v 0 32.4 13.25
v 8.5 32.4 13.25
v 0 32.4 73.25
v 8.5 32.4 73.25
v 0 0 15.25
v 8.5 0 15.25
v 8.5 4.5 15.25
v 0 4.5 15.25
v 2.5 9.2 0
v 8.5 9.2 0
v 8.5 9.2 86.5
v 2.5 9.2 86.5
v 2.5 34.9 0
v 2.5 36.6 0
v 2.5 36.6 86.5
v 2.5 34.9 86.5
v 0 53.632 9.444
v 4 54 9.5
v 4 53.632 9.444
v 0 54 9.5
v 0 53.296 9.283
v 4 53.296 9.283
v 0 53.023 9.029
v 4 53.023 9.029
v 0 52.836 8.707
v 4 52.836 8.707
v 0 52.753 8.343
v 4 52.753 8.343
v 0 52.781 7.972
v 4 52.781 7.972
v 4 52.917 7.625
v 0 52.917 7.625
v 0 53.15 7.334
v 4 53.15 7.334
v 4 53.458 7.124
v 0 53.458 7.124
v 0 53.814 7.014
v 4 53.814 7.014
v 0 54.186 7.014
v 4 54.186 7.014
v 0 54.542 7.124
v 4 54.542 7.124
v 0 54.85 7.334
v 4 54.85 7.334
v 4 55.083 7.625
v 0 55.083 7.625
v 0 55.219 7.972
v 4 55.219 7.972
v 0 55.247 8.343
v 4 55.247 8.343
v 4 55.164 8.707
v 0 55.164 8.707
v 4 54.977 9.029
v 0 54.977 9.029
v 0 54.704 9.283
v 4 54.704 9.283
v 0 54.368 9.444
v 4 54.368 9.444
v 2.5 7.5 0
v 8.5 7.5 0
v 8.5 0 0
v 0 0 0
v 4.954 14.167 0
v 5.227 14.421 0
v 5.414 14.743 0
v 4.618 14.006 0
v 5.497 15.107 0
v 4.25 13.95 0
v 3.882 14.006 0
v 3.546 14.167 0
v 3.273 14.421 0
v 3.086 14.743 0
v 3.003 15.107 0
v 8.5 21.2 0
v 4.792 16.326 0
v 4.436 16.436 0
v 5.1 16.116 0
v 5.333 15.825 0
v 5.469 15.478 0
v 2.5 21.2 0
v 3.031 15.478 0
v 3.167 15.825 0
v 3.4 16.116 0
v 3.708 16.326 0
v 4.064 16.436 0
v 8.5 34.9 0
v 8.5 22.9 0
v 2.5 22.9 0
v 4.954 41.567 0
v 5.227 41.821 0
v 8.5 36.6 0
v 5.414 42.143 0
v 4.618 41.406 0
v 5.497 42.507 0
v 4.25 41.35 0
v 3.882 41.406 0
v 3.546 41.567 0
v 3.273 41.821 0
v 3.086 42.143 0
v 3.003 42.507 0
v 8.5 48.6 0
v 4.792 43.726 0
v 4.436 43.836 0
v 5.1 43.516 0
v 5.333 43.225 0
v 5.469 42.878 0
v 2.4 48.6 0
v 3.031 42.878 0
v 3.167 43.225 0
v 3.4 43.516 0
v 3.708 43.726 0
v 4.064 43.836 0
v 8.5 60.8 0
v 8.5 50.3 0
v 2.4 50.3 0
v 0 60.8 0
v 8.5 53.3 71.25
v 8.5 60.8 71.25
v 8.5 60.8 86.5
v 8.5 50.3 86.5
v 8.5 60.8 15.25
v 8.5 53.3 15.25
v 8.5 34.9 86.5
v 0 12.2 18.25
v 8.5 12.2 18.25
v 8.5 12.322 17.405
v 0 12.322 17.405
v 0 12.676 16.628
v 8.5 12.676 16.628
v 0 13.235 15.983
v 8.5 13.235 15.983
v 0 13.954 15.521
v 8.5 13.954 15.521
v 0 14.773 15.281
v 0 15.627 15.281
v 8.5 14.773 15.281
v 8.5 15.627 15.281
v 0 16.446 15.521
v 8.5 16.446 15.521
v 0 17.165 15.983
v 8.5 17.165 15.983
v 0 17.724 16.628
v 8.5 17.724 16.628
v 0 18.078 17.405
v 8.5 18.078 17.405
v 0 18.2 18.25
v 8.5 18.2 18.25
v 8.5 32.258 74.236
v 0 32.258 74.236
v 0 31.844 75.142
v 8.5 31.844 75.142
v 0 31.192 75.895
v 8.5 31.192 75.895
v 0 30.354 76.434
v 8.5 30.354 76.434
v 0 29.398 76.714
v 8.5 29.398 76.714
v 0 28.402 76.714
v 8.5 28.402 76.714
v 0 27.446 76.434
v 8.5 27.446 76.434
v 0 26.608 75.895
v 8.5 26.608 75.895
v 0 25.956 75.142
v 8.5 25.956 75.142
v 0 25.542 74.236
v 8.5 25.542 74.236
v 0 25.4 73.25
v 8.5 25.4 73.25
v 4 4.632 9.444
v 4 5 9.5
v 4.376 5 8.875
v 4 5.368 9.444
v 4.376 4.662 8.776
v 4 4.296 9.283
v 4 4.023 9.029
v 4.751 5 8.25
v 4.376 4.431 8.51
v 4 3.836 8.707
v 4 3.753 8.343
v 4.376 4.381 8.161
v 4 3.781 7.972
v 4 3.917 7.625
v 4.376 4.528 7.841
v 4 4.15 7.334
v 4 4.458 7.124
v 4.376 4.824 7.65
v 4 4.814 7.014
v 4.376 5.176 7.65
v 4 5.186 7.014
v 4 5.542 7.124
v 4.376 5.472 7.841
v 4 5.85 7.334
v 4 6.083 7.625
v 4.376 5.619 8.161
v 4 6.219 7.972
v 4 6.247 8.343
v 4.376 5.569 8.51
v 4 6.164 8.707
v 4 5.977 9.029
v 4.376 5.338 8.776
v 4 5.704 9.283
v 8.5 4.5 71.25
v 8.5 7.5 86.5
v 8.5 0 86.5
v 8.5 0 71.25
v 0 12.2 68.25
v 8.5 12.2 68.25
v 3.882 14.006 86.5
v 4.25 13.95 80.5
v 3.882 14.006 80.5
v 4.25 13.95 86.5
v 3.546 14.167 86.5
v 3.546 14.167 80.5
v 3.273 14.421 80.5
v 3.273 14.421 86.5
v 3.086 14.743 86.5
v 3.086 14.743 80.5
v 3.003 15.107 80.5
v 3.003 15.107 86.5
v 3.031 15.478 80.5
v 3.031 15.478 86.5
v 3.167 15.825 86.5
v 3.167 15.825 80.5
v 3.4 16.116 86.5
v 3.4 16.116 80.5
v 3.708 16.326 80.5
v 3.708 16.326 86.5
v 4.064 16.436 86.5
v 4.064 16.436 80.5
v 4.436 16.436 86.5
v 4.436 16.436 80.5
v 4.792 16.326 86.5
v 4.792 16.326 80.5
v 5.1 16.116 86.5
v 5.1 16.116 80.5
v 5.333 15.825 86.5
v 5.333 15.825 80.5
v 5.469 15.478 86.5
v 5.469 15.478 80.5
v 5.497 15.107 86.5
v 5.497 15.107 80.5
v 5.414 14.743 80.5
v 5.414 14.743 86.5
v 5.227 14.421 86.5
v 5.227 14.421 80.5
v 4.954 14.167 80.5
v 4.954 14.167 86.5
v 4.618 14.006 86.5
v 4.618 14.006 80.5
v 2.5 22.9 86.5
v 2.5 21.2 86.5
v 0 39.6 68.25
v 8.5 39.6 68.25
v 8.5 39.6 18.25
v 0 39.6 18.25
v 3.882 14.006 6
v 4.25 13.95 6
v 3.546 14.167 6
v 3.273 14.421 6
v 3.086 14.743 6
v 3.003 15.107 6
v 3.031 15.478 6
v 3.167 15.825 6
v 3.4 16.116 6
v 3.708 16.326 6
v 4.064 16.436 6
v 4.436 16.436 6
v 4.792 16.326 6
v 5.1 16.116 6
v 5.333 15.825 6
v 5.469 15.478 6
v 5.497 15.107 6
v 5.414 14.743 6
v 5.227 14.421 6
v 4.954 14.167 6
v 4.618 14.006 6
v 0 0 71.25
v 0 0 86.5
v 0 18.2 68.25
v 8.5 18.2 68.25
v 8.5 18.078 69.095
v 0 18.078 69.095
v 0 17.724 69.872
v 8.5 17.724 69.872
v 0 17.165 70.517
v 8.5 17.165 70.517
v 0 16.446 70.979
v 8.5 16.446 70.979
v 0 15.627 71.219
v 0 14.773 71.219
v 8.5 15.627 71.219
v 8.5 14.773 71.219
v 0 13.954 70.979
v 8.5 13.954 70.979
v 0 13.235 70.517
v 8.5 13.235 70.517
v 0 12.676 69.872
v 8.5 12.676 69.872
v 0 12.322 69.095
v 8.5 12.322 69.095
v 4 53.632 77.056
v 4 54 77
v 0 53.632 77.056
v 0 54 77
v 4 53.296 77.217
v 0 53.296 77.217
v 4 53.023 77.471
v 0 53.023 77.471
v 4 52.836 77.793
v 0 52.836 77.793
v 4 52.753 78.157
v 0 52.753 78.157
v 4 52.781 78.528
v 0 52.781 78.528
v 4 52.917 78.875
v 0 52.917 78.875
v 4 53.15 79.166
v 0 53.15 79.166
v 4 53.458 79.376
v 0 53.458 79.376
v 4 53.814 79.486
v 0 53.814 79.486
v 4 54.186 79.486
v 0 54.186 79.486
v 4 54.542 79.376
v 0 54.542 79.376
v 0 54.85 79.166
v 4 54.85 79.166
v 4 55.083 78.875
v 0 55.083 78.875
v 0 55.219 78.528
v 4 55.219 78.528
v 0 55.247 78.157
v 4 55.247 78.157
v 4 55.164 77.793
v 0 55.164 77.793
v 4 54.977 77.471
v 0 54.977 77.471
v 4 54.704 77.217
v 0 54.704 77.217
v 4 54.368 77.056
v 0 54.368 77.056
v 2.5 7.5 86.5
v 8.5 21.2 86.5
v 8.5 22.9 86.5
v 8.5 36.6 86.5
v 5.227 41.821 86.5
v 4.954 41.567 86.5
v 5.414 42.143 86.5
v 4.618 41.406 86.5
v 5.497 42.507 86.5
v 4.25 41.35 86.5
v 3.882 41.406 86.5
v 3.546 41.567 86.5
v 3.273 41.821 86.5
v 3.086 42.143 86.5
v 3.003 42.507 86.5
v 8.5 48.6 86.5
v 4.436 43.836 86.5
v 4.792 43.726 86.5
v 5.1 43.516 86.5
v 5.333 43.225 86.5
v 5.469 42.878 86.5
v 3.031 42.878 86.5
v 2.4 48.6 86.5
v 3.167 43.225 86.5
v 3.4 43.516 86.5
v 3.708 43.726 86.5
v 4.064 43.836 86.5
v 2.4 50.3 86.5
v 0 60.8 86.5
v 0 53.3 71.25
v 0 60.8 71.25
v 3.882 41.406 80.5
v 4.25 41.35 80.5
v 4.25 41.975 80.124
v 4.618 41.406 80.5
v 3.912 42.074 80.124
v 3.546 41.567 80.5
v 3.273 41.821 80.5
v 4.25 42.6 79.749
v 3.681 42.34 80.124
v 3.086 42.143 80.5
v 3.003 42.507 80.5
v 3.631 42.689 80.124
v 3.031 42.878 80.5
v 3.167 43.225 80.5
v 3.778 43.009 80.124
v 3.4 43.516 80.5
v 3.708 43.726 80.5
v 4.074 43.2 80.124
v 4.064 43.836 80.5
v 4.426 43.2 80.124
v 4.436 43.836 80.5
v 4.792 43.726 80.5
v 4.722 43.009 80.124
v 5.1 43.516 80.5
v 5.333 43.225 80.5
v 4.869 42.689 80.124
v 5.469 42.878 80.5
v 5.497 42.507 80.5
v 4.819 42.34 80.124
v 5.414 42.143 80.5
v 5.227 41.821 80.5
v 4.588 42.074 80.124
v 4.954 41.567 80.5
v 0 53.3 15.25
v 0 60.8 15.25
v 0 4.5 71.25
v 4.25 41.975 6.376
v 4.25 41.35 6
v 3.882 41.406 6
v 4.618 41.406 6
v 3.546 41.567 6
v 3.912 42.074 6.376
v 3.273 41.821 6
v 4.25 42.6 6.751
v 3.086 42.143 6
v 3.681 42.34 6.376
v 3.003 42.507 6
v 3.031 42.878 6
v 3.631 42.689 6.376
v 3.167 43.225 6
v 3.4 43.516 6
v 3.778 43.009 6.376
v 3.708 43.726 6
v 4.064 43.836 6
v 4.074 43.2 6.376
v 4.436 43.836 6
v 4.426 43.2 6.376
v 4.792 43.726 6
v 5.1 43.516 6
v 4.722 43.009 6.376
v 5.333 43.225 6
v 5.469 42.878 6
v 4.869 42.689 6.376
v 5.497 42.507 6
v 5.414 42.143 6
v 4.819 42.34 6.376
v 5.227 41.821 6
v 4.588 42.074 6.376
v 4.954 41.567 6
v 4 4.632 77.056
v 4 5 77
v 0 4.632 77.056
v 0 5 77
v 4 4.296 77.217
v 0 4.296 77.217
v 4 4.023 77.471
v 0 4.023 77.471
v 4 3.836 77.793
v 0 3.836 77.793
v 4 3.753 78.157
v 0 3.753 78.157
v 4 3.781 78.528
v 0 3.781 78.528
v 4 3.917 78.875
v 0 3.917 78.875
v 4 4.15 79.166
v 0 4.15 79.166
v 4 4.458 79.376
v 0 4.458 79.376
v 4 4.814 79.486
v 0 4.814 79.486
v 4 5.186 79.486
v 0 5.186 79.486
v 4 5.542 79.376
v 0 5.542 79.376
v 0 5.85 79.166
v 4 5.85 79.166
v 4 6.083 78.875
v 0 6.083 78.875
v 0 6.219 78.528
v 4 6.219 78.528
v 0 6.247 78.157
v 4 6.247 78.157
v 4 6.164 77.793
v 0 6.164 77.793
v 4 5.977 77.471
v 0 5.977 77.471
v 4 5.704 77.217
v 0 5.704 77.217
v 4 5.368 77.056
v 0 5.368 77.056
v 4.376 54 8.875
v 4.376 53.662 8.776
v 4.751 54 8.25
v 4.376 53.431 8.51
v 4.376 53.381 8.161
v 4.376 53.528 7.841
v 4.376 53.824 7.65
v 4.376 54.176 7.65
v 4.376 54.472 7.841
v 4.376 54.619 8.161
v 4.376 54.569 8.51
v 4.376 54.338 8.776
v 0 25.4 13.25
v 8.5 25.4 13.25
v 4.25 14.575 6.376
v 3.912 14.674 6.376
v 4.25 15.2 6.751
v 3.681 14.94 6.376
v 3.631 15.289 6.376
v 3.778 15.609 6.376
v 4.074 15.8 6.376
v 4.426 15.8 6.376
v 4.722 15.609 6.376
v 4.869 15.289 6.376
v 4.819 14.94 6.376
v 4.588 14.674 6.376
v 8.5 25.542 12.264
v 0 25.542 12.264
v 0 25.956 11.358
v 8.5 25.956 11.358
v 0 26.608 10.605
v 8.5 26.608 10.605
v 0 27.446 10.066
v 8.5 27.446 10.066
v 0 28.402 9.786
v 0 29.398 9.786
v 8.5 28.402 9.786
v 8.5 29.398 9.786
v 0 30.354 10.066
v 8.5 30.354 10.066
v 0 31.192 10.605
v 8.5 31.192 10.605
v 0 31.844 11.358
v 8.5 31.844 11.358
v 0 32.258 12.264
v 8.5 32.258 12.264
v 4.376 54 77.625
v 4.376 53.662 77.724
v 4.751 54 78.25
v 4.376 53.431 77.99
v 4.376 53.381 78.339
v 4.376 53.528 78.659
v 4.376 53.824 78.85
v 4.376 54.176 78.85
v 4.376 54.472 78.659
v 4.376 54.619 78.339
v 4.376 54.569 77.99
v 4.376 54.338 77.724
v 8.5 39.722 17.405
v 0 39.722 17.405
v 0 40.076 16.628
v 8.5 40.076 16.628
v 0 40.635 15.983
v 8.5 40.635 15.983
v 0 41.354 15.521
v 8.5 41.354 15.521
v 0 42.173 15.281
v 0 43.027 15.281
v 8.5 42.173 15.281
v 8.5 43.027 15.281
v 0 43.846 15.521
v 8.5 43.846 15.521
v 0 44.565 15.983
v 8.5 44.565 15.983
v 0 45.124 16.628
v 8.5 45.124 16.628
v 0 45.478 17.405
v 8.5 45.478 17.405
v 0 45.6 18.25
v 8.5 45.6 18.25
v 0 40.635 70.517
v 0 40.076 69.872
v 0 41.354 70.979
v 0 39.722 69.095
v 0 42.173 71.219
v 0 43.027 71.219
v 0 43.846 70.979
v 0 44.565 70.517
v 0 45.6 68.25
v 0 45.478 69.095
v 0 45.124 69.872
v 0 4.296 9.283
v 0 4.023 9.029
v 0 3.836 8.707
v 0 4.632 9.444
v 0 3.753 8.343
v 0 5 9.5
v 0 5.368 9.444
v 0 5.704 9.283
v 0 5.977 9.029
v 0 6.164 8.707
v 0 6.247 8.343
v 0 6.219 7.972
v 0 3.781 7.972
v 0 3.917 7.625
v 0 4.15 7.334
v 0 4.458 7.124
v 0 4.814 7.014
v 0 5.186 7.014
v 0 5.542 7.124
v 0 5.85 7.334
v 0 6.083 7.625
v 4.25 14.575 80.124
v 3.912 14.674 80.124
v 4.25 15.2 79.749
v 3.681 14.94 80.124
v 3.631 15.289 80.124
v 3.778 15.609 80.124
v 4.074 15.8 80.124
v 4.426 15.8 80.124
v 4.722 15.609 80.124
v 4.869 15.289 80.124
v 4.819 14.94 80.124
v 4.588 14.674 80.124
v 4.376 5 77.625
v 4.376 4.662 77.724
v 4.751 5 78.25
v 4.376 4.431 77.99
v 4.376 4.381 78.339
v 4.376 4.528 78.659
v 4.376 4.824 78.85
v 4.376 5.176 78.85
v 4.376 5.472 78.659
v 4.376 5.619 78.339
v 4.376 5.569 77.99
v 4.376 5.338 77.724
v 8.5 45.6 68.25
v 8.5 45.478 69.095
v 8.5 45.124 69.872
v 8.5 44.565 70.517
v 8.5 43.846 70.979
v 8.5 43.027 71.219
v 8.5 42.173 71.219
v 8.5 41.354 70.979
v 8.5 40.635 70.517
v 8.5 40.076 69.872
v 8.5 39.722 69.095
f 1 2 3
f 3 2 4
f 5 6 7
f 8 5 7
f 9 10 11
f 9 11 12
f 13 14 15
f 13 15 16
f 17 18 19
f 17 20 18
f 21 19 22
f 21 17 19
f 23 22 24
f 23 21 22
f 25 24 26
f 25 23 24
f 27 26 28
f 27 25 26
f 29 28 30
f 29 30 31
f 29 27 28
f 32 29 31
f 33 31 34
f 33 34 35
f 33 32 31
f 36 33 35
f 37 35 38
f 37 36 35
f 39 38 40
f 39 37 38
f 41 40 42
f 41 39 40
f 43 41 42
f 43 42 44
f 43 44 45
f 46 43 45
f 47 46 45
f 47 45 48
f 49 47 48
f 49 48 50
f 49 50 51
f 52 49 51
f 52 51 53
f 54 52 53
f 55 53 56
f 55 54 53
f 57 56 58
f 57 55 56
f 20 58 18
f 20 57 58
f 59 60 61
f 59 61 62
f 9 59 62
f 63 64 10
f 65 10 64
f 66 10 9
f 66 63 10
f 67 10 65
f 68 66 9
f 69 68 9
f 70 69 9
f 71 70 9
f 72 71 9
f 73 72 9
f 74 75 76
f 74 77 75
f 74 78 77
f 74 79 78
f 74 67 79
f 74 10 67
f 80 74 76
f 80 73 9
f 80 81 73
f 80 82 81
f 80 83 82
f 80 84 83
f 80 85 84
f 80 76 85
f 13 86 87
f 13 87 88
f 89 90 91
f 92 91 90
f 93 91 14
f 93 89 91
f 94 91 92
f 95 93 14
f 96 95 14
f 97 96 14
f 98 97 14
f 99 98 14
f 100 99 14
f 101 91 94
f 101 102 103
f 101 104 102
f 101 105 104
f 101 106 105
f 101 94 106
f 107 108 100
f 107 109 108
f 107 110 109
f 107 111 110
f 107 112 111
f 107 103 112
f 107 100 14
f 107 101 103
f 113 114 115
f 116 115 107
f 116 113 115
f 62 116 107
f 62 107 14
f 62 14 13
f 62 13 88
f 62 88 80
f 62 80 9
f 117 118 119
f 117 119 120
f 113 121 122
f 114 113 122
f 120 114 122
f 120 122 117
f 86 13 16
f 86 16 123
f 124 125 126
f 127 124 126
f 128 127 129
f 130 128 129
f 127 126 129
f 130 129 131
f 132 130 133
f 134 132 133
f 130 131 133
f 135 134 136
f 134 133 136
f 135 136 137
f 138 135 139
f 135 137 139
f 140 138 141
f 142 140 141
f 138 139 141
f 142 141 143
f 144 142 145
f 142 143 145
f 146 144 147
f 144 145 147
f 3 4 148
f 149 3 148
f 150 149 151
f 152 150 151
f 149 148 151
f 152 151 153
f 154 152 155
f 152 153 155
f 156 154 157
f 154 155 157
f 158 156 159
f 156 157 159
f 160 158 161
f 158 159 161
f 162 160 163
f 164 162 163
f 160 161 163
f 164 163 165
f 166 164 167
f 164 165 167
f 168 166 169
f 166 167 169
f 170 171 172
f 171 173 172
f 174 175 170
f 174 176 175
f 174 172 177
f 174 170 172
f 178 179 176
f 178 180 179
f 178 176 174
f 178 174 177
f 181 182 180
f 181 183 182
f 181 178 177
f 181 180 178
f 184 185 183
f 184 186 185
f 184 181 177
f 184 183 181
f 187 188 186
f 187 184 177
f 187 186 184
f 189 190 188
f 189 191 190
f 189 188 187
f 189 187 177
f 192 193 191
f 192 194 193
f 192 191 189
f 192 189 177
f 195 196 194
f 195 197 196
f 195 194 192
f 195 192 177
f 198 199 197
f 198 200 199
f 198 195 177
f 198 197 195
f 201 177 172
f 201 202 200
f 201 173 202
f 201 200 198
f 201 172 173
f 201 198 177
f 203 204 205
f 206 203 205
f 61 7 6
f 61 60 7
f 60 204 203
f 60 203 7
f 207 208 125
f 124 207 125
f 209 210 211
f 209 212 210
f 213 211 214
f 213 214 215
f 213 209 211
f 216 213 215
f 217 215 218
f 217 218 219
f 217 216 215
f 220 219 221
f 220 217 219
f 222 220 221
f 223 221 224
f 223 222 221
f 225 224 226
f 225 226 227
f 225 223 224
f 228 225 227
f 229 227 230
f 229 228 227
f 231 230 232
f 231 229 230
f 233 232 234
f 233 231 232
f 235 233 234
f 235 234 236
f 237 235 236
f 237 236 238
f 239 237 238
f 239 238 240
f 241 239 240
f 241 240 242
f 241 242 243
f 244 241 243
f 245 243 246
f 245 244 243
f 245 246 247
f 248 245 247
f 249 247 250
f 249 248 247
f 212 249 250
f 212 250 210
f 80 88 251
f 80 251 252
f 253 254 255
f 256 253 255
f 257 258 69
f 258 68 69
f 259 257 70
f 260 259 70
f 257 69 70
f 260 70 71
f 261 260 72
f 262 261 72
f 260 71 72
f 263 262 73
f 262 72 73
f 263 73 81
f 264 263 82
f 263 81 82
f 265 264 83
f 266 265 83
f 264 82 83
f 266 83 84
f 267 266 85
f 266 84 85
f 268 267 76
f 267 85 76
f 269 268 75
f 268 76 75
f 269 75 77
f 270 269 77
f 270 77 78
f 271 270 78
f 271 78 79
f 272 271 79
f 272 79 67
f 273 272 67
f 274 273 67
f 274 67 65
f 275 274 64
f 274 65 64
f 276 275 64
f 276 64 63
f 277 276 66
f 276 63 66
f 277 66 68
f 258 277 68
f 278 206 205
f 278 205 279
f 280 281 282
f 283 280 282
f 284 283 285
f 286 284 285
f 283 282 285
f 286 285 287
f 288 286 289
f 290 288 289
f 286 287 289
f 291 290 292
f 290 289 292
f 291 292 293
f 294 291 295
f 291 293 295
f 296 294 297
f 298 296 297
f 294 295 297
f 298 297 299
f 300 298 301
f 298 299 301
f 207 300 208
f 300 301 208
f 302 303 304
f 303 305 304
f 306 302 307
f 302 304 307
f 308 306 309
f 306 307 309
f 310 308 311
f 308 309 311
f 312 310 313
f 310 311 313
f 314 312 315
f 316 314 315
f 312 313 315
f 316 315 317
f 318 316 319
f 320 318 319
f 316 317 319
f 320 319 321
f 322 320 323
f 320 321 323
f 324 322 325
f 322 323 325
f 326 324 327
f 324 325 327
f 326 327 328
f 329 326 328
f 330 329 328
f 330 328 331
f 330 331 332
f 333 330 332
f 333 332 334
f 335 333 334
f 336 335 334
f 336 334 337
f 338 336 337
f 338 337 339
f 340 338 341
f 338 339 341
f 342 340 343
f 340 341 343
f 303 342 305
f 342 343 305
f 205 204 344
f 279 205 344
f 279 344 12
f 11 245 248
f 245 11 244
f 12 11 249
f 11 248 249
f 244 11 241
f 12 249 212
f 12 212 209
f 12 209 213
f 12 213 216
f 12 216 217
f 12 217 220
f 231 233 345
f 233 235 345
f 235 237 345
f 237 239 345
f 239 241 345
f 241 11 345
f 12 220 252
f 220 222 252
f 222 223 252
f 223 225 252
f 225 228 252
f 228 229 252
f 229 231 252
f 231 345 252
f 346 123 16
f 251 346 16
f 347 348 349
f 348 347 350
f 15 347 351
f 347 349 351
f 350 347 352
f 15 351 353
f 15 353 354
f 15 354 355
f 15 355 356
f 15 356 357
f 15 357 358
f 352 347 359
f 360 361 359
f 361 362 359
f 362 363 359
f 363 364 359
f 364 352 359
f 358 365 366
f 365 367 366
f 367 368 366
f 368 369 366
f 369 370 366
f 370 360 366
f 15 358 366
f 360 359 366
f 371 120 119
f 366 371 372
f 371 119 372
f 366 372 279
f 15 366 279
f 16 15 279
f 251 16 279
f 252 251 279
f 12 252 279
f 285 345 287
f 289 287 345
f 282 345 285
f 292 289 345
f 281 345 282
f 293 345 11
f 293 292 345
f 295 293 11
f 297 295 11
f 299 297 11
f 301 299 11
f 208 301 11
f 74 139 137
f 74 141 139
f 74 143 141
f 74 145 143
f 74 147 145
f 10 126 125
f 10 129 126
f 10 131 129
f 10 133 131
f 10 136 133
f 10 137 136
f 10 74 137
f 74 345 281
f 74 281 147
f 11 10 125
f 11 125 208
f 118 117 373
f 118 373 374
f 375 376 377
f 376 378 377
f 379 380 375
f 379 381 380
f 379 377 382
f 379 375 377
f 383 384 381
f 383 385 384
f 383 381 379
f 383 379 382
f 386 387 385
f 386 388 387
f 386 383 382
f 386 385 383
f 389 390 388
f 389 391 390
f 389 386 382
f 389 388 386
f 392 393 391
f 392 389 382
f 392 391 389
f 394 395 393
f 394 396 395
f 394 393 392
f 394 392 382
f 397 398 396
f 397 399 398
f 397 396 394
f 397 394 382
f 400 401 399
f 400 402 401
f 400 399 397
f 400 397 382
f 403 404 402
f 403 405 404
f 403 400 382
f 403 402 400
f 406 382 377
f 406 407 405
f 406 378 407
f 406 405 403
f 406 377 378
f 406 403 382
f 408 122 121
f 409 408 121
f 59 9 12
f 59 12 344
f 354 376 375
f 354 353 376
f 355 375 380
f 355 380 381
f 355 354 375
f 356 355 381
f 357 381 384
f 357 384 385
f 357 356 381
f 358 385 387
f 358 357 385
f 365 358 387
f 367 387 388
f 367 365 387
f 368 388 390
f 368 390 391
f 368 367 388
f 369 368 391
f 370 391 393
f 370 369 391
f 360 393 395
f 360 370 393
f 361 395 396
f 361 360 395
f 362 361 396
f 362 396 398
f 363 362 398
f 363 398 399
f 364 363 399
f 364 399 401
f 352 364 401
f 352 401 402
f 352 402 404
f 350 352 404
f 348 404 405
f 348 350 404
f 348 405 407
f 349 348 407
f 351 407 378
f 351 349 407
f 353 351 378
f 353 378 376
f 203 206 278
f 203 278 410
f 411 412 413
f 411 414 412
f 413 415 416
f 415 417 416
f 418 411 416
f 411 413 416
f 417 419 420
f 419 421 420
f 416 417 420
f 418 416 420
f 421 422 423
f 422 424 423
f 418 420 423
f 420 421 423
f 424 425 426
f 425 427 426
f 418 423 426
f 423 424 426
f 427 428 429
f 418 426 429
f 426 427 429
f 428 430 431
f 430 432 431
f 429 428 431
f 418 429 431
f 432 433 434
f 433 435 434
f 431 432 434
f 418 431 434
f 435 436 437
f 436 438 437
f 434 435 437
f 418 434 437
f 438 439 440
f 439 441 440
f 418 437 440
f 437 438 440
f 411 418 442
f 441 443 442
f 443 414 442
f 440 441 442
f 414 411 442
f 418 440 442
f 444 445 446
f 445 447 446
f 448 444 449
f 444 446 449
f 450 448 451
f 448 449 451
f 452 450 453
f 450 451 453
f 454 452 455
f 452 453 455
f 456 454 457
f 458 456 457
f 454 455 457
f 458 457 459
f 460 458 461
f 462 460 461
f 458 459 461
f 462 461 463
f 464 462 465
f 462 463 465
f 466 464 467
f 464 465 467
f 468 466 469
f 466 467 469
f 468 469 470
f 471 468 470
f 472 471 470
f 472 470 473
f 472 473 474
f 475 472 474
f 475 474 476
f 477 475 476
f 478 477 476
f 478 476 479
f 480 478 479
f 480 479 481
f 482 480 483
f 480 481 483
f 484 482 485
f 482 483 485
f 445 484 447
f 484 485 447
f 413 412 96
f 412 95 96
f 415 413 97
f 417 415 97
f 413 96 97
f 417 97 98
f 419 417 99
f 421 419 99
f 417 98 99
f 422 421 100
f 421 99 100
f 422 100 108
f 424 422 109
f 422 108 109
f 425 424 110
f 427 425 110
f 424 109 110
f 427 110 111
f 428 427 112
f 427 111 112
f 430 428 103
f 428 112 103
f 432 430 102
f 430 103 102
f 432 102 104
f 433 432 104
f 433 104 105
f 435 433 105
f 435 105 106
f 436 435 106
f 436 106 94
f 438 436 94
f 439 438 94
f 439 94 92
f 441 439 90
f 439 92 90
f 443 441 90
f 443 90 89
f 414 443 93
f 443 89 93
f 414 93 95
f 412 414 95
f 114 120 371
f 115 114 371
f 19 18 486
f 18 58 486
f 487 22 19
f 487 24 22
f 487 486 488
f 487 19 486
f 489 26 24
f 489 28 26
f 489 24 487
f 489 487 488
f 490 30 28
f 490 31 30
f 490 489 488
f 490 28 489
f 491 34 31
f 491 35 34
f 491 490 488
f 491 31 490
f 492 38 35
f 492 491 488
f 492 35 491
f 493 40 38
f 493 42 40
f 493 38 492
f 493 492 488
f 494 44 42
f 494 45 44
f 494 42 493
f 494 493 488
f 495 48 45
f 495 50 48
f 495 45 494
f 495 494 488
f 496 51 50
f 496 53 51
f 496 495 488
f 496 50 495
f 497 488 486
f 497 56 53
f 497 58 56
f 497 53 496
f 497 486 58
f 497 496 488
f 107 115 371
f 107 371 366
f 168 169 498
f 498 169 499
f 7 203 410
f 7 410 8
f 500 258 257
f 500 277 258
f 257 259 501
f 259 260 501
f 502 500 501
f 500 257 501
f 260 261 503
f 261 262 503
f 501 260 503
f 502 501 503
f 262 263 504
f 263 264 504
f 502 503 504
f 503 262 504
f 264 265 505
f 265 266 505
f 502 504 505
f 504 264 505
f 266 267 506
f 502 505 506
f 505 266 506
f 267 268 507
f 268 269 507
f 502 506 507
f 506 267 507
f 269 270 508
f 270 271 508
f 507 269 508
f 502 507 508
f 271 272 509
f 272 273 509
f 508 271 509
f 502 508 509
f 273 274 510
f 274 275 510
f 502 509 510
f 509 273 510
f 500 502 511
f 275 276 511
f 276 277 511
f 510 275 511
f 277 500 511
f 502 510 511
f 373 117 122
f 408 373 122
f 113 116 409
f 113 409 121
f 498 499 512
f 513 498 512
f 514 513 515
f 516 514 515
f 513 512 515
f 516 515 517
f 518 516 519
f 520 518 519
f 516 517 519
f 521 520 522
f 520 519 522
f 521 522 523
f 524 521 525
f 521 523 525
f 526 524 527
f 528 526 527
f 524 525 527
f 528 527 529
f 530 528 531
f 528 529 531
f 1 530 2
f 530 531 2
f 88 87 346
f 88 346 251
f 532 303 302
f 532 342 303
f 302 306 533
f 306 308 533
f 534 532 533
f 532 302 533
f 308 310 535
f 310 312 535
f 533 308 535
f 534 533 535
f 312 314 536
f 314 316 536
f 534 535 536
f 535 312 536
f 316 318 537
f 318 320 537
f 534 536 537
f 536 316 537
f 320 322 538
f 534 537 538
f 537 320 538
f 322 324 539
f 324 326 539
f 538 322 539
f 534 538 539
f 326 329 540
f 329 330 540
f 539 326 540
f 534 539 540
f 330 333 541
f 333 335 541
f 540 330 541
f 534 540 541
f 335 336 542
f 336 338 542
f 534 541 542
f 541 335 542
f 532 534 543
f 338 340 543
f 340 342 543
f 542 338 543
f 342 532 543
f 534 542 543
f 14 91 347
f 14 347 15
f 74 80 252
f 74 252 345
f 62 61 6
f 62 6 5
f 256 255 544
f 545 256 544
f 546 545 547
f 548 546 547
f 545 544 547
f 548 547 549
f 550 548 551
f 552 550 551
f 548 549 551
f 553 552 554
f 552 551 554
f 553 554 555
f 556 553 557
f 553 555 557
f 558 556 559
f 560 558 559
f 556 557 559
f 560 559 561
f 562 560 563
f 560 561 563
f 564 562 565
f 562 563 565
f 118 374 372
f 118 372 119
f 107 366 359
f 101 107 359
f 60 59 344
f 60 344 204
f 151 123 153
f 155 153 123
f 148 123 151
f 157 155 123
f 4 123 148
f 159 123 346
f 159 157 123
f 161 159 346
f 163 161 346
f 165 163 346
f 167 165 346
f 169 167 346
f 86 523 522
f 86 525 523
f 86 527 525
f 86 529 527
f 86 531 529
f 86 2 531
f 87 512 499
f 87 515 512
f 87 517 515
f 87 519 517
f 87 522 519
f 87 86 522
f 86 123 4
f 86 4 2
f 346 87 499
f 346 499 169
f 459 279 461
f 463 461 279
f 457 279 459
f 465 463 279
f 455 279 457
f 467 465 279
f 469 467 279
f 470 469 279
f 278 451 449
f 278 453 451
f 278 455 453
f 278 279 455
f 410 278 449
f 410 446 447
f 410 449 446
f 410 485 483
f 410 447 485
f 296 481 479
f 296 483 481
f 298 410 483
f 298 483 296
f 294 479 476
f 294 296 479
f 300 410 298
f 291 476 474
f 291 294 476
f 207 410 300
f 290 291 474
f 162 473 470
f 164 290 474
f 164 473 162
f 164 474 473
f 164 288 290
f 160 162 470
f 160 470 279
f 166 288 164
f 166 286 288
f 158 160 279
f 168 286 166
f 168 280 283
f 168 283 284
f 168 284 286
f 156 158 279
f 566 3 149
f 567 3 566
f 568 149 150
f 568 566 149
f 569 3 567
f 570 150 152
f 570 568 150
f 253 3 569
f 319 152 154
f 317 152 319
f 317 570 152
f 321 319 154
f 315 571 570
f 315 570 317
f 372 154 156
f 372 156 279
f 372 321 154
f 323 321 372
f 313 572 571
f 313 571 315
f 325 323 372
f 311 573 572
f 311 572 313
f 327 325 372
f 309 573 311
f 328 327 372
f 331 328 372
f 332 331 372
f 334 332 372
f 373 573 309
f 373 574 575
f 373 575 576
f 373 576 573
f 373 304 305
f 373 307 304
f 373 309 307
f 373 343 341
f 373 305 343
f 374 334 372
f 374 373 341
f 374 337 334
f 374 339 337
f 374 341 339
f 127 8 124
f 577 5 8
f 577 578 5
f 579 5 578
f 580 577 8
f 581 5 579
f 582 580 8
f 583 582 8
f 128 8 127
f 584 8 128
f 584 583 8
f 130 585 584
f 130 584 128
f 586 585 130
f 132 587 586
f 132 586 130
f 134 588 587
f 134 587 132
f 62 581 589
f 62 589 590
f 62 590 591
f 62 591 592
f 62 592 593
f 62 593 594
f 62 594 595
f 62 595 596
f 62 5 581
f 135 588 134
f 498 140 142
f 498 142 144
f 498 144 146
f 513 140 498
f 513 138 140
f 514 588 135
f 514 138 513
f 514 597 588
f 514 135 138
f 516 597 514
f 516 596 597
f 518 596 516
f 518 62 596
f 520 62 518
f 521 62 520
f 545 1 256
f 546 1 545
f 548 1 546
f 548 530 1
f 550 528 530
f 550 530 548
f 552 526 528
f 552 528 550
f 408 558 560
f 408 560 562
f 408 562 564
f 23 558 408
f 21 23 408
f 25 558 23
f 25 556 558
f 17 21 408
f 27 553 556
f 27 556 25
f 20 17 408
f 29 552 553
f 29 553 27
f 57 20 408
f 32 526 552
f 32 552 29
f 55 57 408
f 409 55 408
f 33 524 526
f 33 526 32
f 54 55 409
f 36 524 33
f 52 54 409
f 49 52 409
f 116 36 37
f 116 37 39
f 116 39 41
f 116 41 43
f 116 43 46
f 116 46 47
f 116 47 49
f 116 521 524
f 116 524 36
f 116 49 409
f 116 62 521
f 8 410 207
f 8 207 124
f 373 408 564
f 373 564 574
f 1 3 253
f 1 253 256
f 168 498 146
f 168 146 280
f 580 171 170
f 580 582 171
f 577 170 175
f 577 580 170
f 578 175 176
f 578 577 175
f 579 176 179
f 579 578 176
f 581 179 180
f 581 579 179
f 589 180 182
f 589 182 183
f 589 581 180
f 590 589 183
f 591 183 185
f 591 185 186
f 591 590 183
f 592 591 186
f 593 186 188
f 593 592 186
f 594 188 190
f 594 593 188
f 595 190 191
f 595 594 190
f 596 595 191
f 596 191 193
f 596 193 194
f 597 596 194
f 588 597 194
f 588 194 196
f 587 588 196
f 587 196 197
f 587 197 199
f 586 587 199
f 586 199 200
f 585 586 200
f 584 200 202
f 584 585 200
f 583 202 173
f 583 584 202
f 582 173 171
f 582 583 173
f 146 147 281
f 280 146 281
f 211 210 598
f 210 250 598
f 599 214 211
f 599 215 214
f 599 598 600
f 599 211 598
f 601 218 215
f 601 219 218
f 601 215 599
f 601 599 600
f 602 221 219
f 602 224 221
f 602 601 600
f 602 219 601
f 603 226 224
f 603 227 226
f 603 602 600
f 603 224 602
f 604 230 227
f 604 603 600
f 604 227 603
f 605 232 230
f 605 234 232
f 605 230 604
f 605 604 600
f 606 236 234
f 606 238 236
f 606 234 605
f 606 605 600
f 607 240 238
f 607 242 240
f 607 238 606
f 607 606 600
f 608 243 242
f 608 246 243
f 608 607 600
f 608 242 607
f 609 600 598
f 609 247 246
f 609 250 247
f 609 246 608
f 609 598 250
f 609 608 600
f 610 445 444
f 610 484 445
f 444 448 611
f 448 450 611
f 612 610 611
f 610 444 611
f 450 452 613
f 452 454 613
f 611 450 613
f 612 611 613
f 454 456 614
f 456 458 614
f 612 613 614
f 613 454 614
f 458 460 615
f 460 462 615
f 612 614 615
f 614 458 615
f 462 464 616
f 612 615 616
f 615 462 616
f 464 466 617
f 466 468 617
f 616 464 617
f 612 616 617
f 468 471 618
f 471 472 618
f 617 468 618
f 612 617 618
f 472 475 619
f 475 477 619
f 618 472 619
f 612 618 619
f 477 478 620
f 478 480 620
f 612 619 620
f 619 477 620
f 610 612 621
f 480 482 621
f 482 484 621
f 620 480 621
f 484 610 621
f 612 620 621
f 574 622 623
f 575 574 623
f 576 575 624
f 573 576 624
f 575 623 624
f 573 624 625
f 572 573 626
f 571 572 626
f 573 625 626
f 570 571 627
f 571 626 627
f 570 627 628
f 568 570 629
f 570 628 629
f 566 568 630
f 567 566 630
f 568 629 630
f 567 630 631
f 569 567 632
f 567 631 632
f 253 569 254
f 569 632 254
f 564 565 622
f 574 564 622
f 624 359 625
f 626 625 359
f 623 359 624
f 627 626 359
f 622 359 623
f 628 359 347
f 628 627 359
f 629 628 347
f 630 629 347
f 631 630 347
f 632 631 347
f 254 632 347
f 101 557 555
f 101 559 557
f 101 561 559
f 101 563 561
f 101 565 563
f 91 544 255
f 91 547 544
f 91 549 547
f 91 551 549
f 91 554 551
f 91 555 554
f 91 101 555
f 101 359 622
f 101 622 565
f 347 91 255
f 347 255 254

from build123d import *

# Parameters (mm, degrees)
BOSS_EXTRUDE1_DEPTH            = 86.5
M3X0_5_TAPPED_HOLE2_AT_2_COUNT = 2
M3X0_5_TAPPED_HOLE2_AT_2_PITCH = 27.4
M3X0_5_TAPPED_HOLE1_AT_2_COUNT = 2
M3X0_5_TAPPED_HOLE1_AT_2_PITCH = 49
SKETCH14_R                     = 3.5
CUT_EXTRUDE3_DEPTH             = 9.5
CUT_EXTRUDE1_DEPTH             = 9.5
SKETCH15_W                     = 56
SKETCH15_H                     = 7.5
CUT_EXTRUDE4_DEPTH             = 9.5
SKETCH16_W                     = 56
SKETCH16_H                     = 4.5
CUT_EXTRUDE5_DEPTH             = 9.5


with BuildPart() as part:
    # Sketch1 → Boss-Extrude1 (new body)
    with BuildSketch(Plane.XY):
        Polygon((0, 0), (0, 60.8), (8.5, 60.8), (8.5, 50.3), (2.4, 50.3), (2.4, 48.6), (8.5, 48.6), (8.5, 36.6), (2.5, 36.6), (2.5, 34.9), (8.5, 34.9), (8.5, 22.9), (2.5, 22.9), (2.5, 21.2), (8.5, 21.2), (8.5, 9.2), (2.5, 9.2), (2.5, 7.5), (8.5, 7.5), (8.5, 0), align=None)
    extrude(amount=BOSS_EXTRUDE1_DEPTH)

    # Sketch4 → M3x0.5 Tapped Hole2 (revolve, cut)
    with BuildSketch(Plane(origin=(4.25, 42.6, 86.5), x_dir=(0, -1, 0), z_dir=(1, 0, 0))):
        Polygon((0, 0), (0, 6.751075774), (1.25, 6), (1.25, 0), align=None)
    m3x0_5_tapped_hole2 = revolve(axis=Axis((4.25, 42.6, 92.85), (0, 0, -1)), mode=Mode.SUBTRACT)

    # M3x0.5 Tapped Hole2 at 2: M3x0.5 Tapped Hole2 ×2
    with Locations(*[(0, -i * M3X0_5_TAPPED_HOLE2_AT_2_PITCH, 0) for i in range(1, M3X0_5_TAPPED_HOLE2_AT_2_COUNT)]):
        add(m3x0_5_tapped_hole2, mode=Mode.SUBTRACT)

    # Mirror1: M3x0.5 Tapped Hole2 across plane
    add(m3x0_5_tapped_hole2.mirror(Plane.XY.offset(43.25)), mode=Mode.SUBTRACT)

    # Mirror1 copy 1 sketch → Mirror1 copy 1 (revolve, cut)
    with BuildSketch(Plane(origin=(4.25, 15.2, 0), x_dir=(0, -1, 0), z_dir=(1, 0, 0))):
        Polygon((0, 0), (0, -6.751075774), (1.25, -6), (1.25, 0), align=None)
    revolve(axis=Axis((4.25, 15.2, -6.35), (0, 0, -1)), mode=Mode.SUBTRACT)

    # Sketch11 → M3x0.5 Tapped Hole1 (revolve, cut)
    with BuildSketch(Plane(origin=(0, 5, 8.25), x_dir=(0, 0, 1), z_dir=(0, 1, 0))):
        Polygon((0, 0), (0, 4.751075774), (1.25, 4), (1.25, 0), align=None)
    m3x0_5_tapped_hole1 = revolve(axis=Axis((-6.35, 5, 8.25), (1, 0, 0)), mode=Mode.SUBTRACT)

    # M3x0.5 Tapped Hole1 at 2: M3x0.5 Tapped Hole1 ×2
    with Locations(*[(0, i * M3X0_5_TAPPED_HOLE1_AT_2_PITCH, 0) for i in range(1, M3X0_5_TAPPED_HOLE1_AT_2_COUNT)]):
        add(m3x0_5_tapped_hole1, mode=Mode.SUBTRACT)

    # Mirror2: M3x0.5 Tapped Hole1 across plane
    add(m3x0_5_tapped_hole1.mirror(Plane(origin=(0, 0, 43.25), x_dir=(1, 0, 0), z_dir=(0, 0, -1))), mode=Mode.SUBTRACT)

    # Mirror2 copy 1 sketch → Mirror2 copy 1 (revolve, cut)
    with BuildSketch(Plane(origin=(0, 54, 78.25), x_dir=(0, 0, -1), z_dir=(0, 1, 0))):
        Polygon((0, 0), (0, -4.751075774), (1.25, -4), (1.25, 0), align=None)
    revolve(axis=Axis((-6.35, 54, 78.25), (-1, 0, 0)), mode=Mode.SUBTRACT)

    # Sketch14 → Cut-Extrude3 (cut, through all)
    with BuildSketch(Plane(origin=(8.5, 0, 0), x_dir=(0, 0, -1), z_dir=(1, 0, 0))):
        with BuildLine():
            Line((-13.25, 32.4), (-73.25, 32.4))
            ThreePointArc((-73.25, 32.4), (-70.775126266, 31.374873734), (-69.75, 28.9))
            ThreePointArc((-69.75, 28.9), (-70.775126266, 26.425126266), (-73.25, 25.4))
            Line((-73.25, 25.4), (-13.25, 25.4))
            ThreePointArc((-13.25, 25.4), (-16.75, 28.9), (-13.25, 32.4))
        make_face()
        with Locations((-73.25, 28.9)):
            Circle(SKETCH14_R)
        with Locations((-13.25, 28.9)):
            Circle(SKETCH14_R)
    extrude(amount=-CUT_EXTRUDE3_DEPTH, mode=Mode.SUBTRACT)

    # Sketch12 → Cut-Extrude1 (cut, through all)
    with BuildSketch(Plane(origin=(8.5, 0, 0), x_dir=(0, 0, -1), z_dir=(1, 0, 0))):
        with BuildLine():
            Line((-18.25, 45.6), (-68.25, 45.6))
            ThreePointArc((-68.25, 45.6), (-71.25, 42.6), (-68.25, 39.6))
            Line((-68.25, 39.6), (-18.25, 39.6))
            ThreePointArc((-18.25, 39.6), (-15.25, 42.6), (-18.25, 45.6))
        make_face()
        with BuildLine():
            Line((-18.25, 18.2), (-68.25, 18.2))
            ThreePointArc((-68.25, 18.2), (-71.25, 15.2), (-68.25, 12.2))
            Line((-68.25, 12.2), (-18.25, 12.2))
            ThreePointArc((-18.25, 12.2), (-15.25, 15.2), (-18.25, 18.2))
        make_face()
    extrude(amount=-CUT_EXTRUDE1_DEPTH, mode=Mode.SUBTRACT)

    # Sketch15 → Cut-Extrude4 (cut, through all)
    with BuildSketch(Plane(origin=(8.5, 0, 0), x_dir=(0, 0, -1), z_dir=(1, 0, 0))):
        with Locations((-43.25, 57.05)):
            Rectangle(SKETCH15_W, SKETCH15_H)
    extrude(amount=-CUT_EXTRUDE4_DEPTH, mode=Mode.SUBTRACT)

    # Sketch16 → Cut-Extrude5 (cut, through all)
    with BuildSketch(Plane(origin=(8.5, 0, 0), x_dir=(0, 0, -1), z_dir=(1, 0, 0))):
        with Locations((-43.25, 2.25)):
            Rectangle(SKETCH16_W, SKETCH16_H)
    extrude(amount=-CUT_EXTRUDE5_DEPTH, mode=Mode.SUBTRACT)


solid = part.part
